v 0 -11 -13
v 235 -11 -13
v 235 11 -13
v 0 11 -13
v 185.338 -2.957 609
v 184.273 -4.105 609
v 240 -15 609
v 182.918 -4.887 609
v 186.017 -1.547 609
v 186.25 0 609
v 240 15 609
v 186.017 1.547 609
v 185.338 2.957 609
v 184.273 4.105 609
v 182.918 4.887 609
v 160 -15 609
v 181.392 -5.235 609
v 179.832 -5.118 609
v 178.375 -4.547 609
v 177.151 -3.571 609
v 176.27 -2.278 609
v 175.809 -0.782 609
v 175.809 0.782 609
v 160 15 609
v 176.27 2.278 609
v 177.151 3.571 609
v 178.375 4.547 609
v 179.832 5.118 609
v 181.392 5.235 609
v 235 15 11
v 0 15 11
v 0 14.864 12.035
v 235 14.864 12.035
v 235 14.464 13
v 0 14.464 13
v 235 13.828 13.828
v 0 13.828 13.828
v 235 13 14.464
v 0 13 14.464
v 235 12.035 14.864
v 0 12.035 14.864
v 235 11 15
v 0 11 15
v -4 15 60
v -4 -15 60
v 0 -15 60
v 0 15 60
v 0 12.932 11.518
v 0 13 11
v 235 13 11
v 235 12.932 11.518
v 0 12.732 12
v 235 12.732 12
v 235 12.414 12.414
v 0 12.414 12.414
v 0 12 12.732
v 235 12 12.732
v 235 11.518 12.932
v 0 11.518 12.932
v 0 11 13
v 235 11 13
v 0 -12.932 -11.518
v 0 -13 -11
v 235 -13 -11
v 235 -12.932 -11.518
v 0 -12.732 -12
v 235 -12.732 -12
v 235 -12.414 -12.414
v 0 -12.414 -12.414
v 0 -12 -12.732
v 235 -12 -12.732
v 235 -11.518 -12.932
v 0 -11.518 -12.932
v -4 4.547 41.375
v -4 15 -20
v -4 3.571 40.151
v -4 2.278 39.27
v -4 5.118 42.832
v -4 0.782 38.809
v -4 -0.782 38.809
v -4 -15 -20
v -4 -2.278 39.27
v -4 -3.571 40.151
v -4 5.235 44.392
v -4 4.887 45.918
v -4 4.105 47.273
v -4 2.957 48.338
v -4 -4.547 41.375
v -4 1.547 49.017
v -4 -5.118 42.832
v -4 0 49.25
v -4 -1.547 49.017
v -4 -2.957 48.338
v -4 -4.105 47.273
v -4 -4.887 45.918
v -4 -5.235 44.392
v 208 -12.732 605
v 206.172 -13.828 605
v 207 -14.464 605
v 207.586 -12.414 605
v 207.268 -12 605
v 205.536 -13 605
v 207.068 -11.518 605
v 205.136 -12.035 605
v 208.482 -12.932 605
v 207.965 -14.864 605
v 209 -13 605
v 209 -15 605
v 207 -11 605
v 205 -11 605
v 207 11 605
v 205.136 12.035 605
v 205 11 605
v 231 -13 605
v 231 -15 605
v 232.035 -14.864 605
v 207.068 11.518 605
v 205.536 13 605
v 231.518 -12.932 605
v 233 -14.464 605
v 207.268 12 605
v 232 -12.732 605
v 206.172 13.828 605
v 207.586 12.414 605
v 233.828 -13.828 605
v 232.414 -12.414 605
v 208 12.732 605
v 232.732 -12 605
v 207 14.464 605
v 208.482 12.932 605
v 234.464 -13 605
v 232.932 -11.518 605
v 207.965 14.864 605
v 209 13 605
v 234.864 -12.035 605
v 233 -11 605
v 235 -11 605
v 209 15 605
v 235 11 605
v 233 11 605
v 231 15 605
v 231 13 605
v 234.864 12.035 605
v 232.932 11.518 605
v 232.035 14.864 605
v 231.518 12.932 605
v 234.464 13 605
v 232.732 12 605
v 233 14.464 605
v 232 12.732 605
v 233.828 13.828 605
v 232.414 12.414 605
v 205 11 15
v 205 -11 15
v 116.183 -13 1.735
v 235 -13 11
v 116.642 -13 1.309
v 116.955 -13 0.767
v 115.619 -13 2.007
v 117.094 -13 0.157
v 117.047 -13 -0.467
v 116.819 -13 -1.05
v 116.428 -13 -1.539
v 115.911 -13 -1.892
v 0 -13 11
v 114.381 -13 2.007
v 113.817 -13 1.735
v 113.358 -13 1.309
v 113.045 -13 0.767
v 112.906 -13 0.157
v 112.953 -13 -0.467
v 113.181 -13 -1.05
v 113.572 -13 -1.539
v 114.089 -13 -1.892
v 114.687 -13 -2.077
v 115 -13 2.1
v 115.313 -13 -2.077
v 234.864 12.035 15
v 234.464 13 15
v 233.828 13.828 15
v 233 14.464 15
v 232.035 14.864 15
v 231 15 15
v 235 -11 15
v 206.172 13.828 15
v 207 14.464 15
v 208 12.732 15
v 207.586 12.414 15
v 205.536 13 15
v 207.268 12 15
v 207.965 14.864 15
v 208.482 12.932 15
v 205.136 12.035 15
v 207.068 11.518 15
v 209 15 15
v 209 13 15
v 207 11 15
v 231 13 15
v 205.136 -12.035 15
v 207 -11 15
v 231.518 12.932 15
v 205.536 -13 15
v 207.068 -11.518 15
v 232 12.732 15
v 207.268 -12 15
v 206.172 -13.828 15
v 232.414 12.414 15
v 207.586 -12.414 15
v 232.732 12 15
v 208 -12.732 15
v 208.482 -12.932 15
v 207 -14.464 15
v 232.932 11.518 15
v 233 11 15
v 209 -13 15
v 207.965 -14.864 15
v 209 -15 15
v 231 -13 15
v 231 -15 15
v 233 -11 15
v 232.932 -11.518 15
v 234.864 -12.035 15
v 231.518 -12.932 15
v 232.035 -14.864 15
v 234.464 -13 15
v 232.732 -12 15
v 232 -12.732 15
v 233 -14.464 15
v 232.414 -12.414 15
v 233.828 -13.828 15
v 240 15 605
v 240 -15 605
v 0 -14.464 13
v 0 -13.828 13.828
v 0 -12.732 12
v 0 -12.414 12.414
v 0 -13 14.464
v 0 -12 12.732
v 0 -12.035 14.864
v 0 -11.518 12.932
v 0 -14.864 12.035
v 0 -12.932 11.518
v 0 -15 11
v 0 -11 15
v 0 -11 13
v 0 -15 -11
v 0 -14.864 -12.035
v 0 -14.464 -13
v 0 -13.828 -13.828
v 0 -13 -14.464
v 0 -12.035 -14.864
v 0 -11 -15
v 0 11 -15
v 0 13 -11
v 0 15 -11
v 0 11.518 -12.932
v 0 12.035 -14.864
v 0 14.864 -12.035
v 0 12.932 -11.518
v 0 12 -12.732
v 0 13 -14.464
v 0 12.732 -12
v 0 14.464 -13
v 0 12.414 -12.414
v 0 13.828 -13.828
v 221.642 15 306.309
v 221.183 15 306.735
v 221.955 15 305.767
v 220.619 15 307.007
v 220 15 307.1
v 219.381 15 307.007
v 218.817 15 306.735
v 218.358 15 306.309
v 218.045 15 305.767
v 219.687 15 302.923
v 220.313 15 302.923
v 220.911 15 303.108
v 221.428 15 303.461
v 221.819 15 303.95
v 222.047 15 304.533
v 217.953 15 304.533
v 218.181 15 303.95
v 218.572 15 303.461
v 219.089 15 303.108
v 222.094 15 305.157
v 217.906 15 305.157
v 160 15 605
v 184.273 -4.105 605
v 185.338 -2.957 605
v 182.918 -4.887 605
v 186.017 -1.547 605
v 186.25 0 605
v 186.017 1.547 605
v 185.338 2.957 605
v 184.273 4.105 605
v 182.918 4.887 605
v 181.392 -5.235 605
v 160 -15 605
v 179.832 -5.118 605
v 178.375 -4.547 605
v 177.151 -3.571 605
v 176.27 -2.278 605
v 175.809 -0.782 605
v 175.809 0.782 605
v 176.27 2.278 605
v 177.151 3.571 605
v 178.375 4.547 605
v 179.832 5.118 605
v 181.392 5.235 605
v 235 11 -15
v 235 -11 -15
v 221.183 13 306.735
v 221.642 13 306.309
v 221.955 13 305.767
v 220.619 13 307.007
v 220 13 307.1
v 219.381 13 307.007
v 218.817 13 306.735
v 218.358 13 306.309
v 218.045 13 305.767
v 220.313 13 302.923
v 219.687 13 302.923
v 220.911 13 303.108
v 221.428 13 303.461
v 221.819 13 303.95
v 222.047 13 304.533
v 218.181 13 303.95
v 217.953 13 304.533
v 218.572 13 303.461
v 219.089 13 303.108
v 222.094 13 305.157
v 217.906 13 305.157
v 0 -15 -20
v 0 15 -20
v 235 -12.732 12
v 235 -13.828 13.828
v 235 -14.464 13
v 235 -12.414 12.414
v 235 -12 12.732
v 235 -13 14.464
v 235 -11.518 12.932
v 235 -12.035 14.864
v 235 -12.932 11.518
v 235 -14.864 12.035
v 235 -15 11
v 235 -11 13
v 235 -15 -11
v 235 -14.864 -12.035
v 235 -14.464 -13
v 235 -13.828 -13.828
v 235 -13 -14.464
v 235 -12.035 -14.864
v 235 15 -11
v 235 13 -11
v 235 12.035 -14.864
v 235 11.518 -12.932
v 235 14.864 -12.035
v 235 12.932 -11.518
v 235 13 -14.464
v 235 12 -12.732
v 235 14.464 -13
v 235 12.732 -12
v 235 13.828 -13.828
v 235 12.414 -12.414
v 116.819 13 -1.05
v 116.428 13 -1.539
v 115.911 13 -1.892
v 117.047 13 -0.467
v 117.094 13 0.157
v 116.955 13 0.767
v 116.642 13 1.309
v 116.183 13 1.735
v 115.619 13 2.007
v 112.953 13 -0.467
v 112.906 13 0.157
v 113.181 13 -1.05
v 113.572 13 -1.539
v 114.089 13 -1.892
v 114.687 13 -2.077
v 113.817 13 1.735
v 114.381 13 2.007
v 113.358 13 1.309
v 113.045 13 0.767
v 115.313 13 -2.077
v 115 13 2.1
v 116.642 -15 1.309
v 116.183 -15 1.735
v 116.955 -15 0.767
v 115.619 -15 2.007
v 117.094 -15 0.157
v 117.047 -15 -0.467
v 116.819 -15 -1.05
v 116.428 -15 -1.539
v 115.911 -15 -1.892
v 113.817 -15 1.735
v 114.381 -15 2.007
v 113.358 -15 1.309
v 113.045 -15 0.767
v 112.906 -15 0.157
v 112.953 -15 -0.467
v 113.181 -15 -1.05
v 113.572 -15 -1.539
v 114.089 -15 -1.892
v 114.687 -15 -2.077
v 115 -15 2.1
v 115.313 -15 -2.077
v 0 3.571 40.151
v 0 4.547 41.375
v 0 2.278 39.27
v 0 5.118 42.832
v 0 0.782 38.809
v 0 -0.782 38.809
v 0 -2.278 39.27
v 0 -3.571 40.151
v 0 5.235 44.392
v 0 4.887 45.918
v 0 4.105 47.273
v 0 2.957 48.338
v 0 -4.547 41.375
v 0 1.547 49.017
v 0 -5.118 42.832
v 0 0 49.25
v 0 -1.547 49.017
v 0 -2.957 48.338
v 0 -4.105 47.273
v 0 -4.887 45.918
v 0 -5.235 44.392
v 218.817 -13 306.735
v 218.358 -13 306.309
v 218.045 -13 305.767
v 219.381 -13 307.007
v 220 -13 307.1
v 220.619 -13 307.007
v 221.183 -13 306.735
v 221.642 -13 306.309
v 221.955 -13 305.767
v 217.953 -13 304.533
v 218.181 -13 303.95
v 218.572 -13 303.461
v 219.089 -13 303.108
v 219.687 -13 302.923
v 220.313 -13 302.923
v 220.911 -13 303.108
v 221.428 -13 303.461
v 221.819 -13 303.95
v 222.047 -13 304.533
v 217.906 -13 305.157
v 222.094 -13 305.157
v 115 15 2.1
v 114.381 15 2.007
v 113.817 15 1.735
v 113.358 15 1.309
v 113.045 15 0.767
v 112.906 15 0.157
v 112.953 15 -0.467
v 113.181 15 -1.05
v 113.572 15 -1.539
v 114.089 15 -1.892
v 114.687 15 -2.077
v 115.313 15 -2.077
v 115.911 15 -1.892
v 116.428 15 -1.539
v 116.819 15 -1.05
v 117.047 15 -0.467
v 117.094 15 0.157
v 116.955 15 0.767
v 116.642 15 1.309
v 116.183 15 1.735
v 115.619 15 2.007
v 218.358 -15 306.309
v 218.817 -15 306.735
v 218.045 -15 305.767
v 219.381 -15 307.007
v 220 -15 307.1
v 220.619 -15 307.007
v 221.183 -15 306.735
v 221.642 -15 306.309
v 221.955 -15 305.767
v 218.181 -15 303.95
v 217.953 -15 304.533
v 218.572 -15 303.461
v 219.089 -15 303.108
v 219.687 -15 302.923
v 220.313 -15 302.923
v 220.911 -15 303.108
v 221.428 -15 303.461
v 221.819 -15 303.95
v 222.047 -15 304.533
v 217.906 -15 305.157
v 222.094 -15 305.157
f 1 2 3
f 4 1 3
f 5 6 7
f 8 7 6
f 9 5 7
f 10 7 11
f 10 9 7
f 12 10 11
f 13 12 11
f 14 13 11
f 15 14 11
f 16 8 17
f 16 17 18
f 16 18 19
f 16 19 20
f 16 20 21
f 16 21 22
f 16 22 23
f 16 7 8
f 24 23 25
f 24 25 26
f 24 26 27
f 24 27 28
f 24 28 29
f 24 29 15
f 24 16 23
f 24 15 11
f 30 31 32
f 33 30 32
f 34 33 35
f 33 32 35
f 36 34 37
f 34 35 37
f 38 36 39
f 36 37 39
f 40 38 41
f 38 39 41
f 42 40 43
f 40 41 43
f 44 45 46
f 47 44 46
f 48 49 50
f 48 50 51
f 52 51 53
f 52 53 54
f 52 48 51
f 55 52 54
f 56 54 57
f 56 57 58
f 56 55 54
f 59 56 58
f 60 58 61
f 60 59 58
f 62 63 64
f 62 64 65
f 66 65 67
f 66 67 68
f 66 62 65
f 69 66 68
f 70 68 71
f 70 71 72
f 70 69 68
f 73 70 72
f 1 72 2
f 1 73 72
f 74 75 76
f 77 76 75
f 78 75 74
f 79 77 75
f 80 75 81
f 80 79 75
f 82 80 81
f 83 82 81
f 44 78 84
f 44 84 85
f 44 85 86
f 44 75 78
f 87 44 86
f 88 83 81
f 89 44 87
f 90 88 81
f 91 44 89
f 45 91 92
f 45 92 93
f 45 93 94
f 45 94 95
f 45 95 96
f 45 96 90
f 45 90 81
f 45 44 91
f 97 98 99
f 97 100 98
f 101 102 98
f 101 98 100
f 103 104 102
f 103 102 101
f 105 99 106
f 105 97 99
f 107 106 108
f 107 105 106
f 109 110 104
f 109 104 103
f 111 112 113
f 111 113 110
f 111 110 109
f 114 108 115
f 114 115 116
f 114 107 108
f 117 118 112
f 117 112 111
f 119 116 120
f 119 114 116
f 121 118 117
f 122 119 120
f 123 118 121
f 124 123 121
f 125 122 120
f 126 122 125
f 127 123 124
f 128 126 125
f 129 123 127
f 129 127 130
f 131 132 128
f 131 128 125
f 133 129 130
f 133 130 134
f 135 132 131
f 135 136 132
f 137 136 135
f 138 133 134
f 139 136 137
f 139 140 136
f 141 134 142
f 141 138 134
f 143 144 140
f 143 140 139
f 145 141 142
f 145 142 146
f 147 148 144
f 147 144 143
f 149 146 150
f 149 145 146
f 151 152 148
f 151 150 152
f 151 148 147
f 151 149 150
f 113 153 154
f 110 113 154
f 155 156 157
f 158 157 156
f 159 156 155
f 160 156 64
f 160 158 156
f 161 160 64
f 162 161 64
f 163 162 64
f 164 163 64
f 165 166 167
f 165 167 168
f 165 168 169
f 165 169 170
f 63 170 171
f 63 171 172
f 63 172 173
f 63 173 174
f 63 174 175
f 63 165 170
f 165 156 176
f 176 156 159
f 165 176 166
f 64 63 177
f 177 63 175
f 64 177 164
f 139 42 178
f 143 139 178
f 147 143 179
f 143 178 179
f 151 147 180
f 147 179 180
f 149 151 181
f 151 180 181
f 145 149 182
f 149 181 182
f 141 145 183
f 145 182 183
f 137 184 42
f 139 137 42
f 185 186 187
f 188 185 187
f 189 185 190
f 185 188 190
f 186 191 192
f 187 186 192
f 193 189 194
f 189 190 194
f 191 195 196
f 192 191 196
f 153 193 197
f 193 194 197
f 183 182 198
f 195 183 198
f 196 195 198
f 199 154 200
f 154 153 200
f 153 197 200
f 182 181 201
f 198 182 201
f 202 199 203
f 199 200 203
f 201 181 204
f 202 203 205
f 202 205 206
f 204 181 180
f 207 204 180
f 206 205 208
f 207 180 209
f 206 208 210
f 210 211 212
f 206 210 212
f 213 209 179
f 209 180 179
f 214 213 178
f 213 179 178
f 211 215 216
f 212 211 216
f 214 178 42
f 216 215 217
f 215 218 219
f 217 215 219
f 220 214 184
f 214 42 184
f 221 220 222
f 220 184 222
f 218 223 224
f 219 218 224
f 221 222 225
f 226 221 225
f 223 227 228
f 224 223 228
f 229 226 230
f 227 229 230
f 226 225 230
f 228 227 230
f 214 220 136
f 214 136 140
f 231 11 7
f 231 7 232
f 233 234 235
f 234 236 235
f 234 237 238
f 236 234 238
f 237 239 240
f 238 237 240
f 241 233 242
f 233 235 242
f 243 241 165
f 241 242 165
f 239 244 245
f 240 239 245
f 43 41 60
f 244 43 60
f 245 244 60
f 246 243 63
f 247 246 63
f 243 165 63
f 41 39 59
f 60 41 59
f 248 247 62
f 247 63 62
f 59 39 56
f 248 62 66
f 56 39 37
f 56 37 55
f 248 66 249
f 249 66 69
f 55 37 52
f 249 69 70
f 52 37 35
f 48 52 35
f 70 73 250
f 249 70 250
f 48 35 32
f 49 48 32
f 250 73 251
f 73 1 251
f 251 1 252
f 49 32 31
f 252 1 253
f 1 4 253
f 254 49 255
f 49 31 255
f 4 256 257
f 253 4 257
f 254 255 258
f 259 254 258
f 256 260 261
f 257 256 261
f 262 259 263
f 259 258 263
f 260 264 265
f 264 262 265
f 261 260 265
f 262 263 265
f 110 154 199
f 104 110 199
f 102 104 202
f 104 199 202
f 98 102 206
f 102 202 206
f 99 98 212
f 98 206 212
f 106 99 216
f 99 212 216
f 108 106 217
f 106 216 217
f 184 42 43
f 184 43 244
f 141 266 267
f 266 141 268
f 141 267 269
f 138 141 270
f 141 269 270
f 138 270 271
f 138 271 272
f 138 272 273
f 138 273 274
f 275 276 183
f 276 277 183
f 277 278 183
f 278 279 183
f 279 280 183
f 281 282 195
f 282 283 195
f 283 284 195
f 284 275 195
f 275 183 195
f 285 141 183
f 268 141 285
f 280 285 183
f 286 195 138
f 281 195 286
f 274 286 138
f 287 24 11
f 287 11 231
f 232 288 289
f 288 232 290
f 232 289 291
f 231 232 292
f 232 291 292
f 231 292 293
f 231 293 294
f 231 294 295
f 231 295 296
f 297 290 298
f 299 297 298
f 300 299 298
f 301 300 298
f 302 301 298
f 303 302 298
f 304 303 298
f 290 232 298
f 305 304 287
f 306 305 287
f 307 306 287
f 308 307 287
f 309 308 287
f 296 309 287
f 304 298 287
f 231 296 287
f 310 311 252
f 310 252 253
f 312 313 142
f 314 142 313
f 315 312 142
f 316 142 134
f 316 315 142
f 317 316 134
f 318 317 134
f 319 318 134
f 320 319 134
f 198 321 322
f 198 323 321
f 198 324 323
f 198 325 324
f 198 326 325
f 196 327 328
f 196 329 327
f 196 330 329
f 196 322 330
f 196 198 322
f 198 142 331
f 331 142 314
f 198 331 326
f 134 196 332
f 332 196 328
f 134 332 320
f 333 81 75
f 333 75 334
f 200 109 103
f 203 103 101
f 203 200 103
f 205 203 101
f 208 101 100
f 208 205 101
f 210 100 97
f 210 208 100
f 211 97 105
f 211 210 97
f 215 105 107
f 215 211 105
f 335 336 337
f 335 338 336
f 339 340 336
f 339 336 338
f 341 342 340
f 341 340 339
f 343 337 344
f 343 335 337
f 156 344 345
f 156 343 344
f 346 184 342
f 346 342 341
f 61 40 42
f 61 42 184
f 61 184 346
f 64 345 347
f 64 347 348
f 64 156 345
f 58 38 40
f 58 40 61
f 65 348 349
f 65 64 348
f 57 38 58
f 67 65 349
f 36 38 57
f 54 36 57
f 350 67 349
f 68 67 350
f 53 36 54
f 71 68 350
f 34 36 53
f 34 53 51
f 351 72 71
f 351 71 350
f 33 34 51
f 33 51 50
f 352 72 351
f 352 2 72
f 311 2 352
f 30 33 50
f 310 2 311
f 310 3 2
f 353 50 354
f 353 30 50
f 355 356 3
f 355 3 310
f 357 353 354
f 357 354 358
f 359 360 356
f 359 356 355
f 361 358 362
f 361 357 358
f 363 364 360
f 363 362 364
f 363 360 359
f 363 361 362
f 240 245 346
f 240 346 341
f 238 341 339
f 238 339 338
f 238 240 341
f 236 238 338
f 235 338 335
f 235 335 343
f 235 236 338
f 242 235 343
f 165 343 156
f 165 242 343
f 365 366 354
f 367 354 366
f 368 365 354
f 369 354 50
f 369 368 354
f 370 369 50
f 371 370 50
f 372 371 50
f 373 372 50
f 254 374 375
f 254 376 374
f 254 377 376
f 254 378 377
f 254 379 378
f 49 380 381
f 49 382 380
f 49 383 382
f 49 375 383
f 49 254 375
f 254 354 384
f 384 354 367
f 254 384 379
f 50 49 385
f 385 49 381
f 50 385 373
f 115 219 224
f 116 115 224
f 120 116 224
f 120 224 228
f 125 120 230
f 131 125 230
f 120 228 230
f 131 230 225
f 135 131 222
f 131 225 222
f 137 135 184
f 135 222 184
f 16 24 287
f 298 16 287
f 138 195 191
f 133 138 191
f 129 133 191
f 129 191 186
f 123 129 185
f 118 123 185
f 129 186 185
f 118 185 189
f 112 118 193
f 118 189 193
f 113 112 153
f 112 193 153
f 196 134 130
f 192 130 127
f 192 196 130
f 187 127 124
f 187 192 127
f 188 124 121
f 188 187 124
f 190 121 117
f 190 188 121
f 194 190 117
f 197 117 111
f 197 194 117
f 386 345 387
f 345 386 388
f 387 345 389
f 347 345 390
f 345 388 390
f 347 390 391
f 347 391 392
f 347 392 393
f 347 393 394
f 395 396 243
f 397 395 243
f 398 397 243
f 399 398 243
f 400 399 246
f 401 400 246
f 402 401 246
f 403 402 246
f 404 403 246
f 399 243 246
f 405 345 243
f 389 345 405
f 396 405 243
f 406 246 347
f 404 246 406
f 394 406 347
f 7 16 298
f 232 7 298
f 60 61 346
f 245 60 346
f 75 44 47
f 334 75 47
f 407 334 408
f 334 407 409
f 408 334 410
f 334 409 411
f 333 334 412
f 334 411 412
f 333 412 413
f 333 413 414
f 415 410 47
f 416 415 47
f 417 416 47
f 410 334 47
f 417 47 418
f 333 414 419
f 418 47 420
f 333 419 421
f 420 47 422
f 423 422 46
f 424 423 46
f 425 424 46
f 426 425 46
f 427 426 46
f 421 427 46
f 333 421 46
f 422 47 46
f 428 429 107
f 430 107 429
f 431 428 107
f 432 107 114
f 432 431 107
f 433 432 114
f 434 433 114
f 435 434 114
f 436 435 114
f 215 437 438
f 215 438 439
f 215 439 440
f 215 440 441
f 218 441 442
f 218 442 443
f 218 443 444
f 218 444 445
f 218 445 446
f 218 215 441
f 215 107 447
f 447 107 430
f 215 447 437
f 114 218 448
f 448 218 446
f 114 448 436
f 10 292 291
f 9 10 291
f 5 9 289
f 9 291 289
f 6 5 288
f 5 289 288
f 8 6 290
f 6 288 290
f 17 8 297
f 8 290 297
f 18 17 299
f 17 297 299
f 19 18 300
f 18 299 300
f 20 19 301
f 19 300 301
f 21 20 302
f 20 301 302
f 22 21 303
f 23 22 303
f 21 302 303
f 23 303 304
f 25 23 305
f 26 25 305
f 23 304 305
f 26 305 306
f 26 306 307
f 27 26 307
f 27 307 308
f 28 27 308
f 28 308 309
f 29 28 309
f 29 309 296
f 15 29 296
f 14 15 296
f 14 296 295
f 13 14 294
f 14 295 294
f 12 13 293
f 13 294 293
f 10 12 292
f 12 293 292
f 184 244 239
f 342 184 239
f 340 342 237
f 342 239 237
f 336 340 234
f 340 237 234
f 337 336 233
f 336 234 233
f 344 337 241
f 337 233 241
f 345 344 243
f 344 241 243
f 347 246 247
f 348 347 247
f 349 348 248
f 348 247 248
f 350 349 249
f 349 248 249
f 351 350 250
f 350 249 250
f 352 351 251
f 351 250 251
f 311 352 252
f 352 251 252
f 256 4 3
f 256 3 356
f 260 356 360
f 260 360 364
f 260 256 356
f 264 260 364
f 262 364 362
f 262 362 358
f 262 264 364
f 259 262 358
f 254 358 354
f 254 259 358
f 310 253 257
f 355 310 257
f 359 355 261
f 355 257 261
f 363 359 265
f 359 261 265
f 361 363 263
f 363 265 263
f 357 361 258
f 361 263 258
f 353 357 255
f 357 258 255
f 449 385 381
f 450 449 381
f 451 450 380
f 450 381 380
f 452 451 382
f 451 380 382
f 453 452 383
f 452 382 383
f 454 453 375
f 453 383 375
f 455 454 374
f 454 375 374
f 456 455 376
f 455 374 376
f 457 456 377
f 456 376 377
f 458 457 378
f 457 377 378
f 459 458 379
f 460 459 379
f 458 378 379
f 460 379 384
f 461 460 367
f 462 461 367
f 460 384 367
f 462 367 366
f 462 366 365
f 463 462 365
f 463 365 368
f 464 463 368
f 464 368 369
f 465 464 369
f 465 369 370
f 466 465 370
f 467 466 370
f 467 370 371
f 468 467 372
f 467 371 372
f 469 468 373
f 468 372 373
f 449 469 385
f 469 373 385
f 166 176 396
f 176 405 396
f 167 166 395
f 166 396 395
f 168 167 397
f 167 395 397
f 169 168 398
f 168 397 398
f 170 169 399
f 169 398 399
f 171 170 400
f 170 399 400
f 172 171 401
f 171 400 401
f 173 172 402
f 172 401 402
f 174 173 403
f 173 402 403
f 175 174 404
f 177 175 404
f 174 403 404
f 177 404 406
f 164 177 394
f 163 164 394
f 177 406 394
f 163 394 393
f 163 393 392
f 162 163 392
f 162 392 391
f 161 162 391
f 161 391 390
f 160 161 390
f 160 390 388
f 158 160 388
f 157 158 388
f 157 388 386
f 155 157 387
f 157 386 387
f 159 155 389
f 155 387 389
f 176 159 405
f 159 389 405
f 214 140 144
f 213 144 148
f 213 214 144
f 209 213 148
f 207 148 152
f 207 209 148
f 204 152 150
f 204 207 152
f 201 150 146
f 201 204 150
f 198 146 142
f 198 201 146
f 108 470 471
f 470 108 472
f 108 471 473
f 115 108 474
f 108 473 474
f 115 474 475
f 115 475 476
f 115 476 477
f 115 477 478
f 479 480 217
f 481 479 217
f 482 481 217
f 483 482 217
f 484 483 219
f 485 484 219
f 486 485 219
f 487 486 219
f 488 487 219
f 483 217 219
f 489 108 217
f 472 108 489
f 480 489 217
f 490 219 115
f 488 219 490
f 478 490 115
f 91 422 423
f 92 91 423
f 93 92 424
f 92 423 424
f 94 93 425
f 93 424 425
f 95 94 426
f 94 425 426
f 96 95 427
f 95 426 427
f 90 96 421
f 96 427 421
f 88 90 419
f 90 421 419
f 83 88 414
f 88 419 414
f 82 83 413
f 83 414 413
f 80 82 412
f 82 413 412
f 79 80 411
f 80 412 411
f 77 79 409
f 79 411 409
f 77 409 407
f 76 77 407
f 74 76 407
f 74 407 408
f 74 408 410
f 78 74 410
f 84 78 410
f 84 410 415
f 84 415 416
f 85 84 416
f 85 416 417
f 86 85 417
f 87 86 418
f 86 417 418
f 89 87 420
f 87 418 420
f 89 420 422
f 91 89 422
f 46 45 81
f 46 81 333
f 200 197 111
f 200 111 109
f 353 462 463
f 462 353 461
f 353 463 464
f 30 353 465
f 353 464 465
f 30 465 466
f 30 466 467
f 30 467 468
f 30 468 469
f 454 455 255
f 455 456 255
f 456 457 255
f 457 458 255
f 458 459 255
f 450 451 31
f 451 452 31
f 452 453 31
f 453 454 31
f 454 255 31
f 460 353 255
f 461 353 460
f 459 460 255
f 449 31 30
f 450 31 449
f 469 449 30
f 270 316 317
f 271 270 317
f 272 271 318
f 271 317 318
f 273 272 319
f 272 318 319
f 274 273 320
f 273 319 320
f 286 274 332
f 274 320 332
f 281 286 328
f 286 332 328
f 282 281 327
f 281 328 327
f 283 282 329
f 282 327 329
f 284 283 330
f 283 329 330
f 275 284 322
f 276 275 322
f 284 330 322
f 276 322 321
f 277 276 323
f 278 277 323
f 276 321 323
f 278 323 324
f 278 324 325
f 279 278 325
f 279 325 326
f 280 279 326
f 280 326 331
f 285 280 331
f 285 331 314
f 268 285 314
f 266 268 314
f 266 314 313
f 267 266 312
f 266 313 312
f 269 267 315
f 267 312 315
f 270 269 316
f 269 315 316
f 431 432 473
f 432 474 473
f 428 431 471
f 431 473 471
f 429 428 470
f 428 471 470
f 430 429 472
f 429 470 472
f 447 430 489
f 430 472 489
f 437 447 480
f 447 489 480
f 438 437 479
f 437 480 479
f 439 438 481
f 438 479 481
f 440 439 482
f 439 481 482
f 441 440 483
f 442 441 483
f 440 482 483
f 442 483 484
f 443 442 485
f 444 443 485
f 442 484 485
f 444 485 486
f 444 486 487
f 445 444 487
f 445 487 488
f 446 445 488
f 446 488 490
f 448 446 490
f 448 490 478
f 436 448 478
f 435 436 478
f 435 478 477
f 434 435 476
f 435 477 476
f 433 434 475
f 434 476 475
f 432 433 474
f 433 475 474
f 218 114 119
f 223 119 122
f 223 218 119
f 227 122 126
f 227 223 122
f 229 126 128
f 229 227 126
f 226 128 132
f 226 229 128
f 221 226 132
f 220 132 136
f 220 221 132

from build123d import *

# Parameters (mm, degrees)
SQUARE_TUBE_CONFIGURED_30_X_30_X_2_DEPTH   = 235
SQUARE_TUBE_CONFIGURED_30_X_30_X_2_2_DEPTH = 606
SKETCH11_W                                 = 4
SKETCH11_H                                 = 30
METAL_BAR_30_X_4_DEPTH                     = 80
SKETCH14_W                                 = 4
SKETCH14_H                                 = 30
METAL_BAR_30_X_4_2_DEPTH                   = 80
SKETCH16_W                                 = 5.25
SKETCH16_H                                 = 211
SKETCH16_AT_POINT_2_W                      = 5.25
SKETCH16_AT_POINT_2_H                      = 211
SKETCH18_W                                 = 2.1
SKETCH18_H                                 = 30
F_4_2_4_2_TABLE_MOUNT_HOLES_AT_2_COUNT     = 2
F_4_2_4_2_TABLE_MOUNT_HOLES_AT_2_PITCH     = 322.567822326


with BuildPart() as part:
    # Sketch1 → Square tube - configured 30 X 30 X 2 (new body)
    with BuildSketch(Plane(origin=(0, 0, 0), x_dir=(0, 0, -1), z_dir=(1, 0, 0))):
        with BuildLine():
            Line((-11, -15), (11, -15))
            ThreePointArc((11, -15), (13.828427125, -13.828427125), (15, -11))
            Line((15, -11), (15, 11))
            ThreePointArc((15, 11), (13.828427125, 13.828427125), (11, 15))
            Line((11, 15), (-11, 15))
            ThreePointArc((-11, 15), (-13.828427125, 13.828427125), (-15, 11))
            Line((-15, 11), (-15, -11))
            ThreePointArc((-15, -11), (-13.828427125, -13.828427125), (-11, -15))
        make_face()
        with BuildLine():
            Line((-11, -13), (11, -13))
            ThreePointArc((11, -13), (12.414213562, -12.414213562), (13, -11))
            Line((13, -11), (13, 11))
            ThreePointArc((13, 11), (12.414213562, 12.414213562), (11, 13))
            Line((11, 13), (-11, 13))
            ThreePointArc((-11, 13), (-12.414213562, 12.414213562), (-13, 11))
            Line((-13, 11), (-13, -11))
            ThreePointArc((-13, -11), (-12.414213562, -12.414213562), (-11, -13))
        make_face(mode=Mode.SUBTRACT)
    extrude(amount=SQUARE_TUBE_CONFIGURED_30_X_30_X_2_DEPTH)

    # Sketch18 → Ø4.2 (4.2) Table Mount Holes (revolve, cut)
    with BuildSketch(Plane(origin=(115, 15, 0), x_dir=(0, 0, 1), z_dir=(1, 0, 0))):
        with Locations((1.05, 15)):
            Rectangle(SKETCH18_W, SKETCH18_H)
    f_4_2_4_2_table_mount_holes = revolve(axis=Axis((115, 21.35, 0), (0, -1, 0)), mode=Mode.SUBTRACT)


with BuildPart() as body_2:
    # Sketch1 on segment 2 (carried to segment 2) → Square tube - configured 30 X 30 X 2 2 (new body)
    with BuildSketch(Plane(origin=(220, 0, -1), x_dir=(1, 0, 0), z_dir=(0, 0, 1))):
        with BuildLine():
            Line((-11, -15), (11, -15))
            ThreePointArc((11, -15), (13.828427125, -13.828427125), (15, -11))
            Line((15, -11), (15, 11))
            ThreePointArc((15, 11), (13.828427125, 13.828427125), (11, 15))
            Line((11, 15), (-11, 15))
            ThreePointArc((-11, 15), (-13.828427125, 13.828427125), (-15, 11))
            Line((-15, 11), (-15, -11))
            ThreePointArc((-15, -11), (-13.828427125, -13.828427125), (-11, -15))
        make_face()
        with BuildLine():
            Line((-11, -13), (11, -13))
            ThreePointArc((11, -13), (12.414213562, -12.414213562), (13, -11))
            Line((13, -11), (13, 11))
            ThreePointArc((13, 11), (12.414213562, 12.414213562), (11, 13))
            Line((11, 13), (-11, 13))
            ThreePointArc((-11, 13), (-12.414213562, 12.414213562), (-13, 11))
            Line((-13, 11), (-13, -11))
            ThreePointArc((-13, -11), (-12.414213562, -12.414213562), (-11, -13))
        make_face(mode=Mode.SUBTRACT)
    extrude(amount=SQUARE_TUBE_CONFIGURED_30_X_30_X_2_2_DEPTH)

    # Square tube - configured 30 X 30 X 2 2 e
    split(bisect_by=Plane(origin=(220, 0, 15), x_dir=(0, -1, 0), z_dir=(0, 0, 1)), keep=Keep.TOP)

    # Ø4.2 (4.2) Table Mount Holes at 2: Ø4.2 (4.2) Table Mount Holes ×2
    with Locations(*[Vector(0.3255129393965166, 0, 0.9455375858660722) * (i * F_4_2_4_2_TABLE_MOUNT_HOLES_AT_2_PITCH) for i in range(1, F_4_2_4_2_TABLE_MOUNT_HOLES_AT_2_COUNT)]):
        add(f_4_2_4_2_table_mount_holes, mode=Mode.SUBTRACT)


with BuildPart() as body_3:
    # Sketch11 → Metal bar 30 X 4 (new body)
    with BuildSketch(Plane(origin=(0, 0, 60), x_dir=(1, 0, 0), z_dir=(0, 0, -1))):
        with Locations((-2, 0)):
            Rectangle(SKETCH11_W, SKETCH11_H)
    extrude(amount=METAL_BAR_30_X_4_DEPTH)

    # Sketch16 → Ø10.5 (10.5) Main Frame Mount Holes (revolve, cut)
    with BuildSketch(Plane(origin=(-4, 0, 44), x_dir=(0, 0, 1), z_dir=(0, 1, 0))):
        with Locations((2.625, 105.5)):
            Rectangle(SKETCH16_W, SKETCH16_H)
    revolve(axis=Axis((-10.35, 0, 44), (1, 0, 0)), mode=Mode.SUBTRACT)


with BuildPart() as body_4:
    # Sketch14 → Metal bar 30 X 4(2) (new body)
    with BuildSketch(Plane(origin=(160, 0, 605), x_dir=(0, 0, -1), z_dir=(1, 0, 0))):
        with Locations((-2, 0)):
            Rectangle(SKETCH14_W, SKETCH14_H)
    extrude(amount=METAL_BAR_30_X_4_2_DEPTH)

    # Sketch16 at point 2 (carried to point 2, square into its face) → Ø10.5 (10.5) Main Frame Mount Holes at 2 (revolve, cut)
    with BuildSketch(Plane(origin=(181, 0, 609), x_dir=(1, 0, 0), z_dir=(0, 1, 0))):
        with Locations((2.625, 105.5)):
            Rectangle(SKETCH16_AT_POINT_2_W, SKETCH16_AT_POINT_2_H)
    revolve(axis=Axis((181, 0, 615.35), (0, 0, -1)), mode=Mode.SUBTRACT)


solid = Compound([part.part, body_2.part, body_3.part, body_4.part])
